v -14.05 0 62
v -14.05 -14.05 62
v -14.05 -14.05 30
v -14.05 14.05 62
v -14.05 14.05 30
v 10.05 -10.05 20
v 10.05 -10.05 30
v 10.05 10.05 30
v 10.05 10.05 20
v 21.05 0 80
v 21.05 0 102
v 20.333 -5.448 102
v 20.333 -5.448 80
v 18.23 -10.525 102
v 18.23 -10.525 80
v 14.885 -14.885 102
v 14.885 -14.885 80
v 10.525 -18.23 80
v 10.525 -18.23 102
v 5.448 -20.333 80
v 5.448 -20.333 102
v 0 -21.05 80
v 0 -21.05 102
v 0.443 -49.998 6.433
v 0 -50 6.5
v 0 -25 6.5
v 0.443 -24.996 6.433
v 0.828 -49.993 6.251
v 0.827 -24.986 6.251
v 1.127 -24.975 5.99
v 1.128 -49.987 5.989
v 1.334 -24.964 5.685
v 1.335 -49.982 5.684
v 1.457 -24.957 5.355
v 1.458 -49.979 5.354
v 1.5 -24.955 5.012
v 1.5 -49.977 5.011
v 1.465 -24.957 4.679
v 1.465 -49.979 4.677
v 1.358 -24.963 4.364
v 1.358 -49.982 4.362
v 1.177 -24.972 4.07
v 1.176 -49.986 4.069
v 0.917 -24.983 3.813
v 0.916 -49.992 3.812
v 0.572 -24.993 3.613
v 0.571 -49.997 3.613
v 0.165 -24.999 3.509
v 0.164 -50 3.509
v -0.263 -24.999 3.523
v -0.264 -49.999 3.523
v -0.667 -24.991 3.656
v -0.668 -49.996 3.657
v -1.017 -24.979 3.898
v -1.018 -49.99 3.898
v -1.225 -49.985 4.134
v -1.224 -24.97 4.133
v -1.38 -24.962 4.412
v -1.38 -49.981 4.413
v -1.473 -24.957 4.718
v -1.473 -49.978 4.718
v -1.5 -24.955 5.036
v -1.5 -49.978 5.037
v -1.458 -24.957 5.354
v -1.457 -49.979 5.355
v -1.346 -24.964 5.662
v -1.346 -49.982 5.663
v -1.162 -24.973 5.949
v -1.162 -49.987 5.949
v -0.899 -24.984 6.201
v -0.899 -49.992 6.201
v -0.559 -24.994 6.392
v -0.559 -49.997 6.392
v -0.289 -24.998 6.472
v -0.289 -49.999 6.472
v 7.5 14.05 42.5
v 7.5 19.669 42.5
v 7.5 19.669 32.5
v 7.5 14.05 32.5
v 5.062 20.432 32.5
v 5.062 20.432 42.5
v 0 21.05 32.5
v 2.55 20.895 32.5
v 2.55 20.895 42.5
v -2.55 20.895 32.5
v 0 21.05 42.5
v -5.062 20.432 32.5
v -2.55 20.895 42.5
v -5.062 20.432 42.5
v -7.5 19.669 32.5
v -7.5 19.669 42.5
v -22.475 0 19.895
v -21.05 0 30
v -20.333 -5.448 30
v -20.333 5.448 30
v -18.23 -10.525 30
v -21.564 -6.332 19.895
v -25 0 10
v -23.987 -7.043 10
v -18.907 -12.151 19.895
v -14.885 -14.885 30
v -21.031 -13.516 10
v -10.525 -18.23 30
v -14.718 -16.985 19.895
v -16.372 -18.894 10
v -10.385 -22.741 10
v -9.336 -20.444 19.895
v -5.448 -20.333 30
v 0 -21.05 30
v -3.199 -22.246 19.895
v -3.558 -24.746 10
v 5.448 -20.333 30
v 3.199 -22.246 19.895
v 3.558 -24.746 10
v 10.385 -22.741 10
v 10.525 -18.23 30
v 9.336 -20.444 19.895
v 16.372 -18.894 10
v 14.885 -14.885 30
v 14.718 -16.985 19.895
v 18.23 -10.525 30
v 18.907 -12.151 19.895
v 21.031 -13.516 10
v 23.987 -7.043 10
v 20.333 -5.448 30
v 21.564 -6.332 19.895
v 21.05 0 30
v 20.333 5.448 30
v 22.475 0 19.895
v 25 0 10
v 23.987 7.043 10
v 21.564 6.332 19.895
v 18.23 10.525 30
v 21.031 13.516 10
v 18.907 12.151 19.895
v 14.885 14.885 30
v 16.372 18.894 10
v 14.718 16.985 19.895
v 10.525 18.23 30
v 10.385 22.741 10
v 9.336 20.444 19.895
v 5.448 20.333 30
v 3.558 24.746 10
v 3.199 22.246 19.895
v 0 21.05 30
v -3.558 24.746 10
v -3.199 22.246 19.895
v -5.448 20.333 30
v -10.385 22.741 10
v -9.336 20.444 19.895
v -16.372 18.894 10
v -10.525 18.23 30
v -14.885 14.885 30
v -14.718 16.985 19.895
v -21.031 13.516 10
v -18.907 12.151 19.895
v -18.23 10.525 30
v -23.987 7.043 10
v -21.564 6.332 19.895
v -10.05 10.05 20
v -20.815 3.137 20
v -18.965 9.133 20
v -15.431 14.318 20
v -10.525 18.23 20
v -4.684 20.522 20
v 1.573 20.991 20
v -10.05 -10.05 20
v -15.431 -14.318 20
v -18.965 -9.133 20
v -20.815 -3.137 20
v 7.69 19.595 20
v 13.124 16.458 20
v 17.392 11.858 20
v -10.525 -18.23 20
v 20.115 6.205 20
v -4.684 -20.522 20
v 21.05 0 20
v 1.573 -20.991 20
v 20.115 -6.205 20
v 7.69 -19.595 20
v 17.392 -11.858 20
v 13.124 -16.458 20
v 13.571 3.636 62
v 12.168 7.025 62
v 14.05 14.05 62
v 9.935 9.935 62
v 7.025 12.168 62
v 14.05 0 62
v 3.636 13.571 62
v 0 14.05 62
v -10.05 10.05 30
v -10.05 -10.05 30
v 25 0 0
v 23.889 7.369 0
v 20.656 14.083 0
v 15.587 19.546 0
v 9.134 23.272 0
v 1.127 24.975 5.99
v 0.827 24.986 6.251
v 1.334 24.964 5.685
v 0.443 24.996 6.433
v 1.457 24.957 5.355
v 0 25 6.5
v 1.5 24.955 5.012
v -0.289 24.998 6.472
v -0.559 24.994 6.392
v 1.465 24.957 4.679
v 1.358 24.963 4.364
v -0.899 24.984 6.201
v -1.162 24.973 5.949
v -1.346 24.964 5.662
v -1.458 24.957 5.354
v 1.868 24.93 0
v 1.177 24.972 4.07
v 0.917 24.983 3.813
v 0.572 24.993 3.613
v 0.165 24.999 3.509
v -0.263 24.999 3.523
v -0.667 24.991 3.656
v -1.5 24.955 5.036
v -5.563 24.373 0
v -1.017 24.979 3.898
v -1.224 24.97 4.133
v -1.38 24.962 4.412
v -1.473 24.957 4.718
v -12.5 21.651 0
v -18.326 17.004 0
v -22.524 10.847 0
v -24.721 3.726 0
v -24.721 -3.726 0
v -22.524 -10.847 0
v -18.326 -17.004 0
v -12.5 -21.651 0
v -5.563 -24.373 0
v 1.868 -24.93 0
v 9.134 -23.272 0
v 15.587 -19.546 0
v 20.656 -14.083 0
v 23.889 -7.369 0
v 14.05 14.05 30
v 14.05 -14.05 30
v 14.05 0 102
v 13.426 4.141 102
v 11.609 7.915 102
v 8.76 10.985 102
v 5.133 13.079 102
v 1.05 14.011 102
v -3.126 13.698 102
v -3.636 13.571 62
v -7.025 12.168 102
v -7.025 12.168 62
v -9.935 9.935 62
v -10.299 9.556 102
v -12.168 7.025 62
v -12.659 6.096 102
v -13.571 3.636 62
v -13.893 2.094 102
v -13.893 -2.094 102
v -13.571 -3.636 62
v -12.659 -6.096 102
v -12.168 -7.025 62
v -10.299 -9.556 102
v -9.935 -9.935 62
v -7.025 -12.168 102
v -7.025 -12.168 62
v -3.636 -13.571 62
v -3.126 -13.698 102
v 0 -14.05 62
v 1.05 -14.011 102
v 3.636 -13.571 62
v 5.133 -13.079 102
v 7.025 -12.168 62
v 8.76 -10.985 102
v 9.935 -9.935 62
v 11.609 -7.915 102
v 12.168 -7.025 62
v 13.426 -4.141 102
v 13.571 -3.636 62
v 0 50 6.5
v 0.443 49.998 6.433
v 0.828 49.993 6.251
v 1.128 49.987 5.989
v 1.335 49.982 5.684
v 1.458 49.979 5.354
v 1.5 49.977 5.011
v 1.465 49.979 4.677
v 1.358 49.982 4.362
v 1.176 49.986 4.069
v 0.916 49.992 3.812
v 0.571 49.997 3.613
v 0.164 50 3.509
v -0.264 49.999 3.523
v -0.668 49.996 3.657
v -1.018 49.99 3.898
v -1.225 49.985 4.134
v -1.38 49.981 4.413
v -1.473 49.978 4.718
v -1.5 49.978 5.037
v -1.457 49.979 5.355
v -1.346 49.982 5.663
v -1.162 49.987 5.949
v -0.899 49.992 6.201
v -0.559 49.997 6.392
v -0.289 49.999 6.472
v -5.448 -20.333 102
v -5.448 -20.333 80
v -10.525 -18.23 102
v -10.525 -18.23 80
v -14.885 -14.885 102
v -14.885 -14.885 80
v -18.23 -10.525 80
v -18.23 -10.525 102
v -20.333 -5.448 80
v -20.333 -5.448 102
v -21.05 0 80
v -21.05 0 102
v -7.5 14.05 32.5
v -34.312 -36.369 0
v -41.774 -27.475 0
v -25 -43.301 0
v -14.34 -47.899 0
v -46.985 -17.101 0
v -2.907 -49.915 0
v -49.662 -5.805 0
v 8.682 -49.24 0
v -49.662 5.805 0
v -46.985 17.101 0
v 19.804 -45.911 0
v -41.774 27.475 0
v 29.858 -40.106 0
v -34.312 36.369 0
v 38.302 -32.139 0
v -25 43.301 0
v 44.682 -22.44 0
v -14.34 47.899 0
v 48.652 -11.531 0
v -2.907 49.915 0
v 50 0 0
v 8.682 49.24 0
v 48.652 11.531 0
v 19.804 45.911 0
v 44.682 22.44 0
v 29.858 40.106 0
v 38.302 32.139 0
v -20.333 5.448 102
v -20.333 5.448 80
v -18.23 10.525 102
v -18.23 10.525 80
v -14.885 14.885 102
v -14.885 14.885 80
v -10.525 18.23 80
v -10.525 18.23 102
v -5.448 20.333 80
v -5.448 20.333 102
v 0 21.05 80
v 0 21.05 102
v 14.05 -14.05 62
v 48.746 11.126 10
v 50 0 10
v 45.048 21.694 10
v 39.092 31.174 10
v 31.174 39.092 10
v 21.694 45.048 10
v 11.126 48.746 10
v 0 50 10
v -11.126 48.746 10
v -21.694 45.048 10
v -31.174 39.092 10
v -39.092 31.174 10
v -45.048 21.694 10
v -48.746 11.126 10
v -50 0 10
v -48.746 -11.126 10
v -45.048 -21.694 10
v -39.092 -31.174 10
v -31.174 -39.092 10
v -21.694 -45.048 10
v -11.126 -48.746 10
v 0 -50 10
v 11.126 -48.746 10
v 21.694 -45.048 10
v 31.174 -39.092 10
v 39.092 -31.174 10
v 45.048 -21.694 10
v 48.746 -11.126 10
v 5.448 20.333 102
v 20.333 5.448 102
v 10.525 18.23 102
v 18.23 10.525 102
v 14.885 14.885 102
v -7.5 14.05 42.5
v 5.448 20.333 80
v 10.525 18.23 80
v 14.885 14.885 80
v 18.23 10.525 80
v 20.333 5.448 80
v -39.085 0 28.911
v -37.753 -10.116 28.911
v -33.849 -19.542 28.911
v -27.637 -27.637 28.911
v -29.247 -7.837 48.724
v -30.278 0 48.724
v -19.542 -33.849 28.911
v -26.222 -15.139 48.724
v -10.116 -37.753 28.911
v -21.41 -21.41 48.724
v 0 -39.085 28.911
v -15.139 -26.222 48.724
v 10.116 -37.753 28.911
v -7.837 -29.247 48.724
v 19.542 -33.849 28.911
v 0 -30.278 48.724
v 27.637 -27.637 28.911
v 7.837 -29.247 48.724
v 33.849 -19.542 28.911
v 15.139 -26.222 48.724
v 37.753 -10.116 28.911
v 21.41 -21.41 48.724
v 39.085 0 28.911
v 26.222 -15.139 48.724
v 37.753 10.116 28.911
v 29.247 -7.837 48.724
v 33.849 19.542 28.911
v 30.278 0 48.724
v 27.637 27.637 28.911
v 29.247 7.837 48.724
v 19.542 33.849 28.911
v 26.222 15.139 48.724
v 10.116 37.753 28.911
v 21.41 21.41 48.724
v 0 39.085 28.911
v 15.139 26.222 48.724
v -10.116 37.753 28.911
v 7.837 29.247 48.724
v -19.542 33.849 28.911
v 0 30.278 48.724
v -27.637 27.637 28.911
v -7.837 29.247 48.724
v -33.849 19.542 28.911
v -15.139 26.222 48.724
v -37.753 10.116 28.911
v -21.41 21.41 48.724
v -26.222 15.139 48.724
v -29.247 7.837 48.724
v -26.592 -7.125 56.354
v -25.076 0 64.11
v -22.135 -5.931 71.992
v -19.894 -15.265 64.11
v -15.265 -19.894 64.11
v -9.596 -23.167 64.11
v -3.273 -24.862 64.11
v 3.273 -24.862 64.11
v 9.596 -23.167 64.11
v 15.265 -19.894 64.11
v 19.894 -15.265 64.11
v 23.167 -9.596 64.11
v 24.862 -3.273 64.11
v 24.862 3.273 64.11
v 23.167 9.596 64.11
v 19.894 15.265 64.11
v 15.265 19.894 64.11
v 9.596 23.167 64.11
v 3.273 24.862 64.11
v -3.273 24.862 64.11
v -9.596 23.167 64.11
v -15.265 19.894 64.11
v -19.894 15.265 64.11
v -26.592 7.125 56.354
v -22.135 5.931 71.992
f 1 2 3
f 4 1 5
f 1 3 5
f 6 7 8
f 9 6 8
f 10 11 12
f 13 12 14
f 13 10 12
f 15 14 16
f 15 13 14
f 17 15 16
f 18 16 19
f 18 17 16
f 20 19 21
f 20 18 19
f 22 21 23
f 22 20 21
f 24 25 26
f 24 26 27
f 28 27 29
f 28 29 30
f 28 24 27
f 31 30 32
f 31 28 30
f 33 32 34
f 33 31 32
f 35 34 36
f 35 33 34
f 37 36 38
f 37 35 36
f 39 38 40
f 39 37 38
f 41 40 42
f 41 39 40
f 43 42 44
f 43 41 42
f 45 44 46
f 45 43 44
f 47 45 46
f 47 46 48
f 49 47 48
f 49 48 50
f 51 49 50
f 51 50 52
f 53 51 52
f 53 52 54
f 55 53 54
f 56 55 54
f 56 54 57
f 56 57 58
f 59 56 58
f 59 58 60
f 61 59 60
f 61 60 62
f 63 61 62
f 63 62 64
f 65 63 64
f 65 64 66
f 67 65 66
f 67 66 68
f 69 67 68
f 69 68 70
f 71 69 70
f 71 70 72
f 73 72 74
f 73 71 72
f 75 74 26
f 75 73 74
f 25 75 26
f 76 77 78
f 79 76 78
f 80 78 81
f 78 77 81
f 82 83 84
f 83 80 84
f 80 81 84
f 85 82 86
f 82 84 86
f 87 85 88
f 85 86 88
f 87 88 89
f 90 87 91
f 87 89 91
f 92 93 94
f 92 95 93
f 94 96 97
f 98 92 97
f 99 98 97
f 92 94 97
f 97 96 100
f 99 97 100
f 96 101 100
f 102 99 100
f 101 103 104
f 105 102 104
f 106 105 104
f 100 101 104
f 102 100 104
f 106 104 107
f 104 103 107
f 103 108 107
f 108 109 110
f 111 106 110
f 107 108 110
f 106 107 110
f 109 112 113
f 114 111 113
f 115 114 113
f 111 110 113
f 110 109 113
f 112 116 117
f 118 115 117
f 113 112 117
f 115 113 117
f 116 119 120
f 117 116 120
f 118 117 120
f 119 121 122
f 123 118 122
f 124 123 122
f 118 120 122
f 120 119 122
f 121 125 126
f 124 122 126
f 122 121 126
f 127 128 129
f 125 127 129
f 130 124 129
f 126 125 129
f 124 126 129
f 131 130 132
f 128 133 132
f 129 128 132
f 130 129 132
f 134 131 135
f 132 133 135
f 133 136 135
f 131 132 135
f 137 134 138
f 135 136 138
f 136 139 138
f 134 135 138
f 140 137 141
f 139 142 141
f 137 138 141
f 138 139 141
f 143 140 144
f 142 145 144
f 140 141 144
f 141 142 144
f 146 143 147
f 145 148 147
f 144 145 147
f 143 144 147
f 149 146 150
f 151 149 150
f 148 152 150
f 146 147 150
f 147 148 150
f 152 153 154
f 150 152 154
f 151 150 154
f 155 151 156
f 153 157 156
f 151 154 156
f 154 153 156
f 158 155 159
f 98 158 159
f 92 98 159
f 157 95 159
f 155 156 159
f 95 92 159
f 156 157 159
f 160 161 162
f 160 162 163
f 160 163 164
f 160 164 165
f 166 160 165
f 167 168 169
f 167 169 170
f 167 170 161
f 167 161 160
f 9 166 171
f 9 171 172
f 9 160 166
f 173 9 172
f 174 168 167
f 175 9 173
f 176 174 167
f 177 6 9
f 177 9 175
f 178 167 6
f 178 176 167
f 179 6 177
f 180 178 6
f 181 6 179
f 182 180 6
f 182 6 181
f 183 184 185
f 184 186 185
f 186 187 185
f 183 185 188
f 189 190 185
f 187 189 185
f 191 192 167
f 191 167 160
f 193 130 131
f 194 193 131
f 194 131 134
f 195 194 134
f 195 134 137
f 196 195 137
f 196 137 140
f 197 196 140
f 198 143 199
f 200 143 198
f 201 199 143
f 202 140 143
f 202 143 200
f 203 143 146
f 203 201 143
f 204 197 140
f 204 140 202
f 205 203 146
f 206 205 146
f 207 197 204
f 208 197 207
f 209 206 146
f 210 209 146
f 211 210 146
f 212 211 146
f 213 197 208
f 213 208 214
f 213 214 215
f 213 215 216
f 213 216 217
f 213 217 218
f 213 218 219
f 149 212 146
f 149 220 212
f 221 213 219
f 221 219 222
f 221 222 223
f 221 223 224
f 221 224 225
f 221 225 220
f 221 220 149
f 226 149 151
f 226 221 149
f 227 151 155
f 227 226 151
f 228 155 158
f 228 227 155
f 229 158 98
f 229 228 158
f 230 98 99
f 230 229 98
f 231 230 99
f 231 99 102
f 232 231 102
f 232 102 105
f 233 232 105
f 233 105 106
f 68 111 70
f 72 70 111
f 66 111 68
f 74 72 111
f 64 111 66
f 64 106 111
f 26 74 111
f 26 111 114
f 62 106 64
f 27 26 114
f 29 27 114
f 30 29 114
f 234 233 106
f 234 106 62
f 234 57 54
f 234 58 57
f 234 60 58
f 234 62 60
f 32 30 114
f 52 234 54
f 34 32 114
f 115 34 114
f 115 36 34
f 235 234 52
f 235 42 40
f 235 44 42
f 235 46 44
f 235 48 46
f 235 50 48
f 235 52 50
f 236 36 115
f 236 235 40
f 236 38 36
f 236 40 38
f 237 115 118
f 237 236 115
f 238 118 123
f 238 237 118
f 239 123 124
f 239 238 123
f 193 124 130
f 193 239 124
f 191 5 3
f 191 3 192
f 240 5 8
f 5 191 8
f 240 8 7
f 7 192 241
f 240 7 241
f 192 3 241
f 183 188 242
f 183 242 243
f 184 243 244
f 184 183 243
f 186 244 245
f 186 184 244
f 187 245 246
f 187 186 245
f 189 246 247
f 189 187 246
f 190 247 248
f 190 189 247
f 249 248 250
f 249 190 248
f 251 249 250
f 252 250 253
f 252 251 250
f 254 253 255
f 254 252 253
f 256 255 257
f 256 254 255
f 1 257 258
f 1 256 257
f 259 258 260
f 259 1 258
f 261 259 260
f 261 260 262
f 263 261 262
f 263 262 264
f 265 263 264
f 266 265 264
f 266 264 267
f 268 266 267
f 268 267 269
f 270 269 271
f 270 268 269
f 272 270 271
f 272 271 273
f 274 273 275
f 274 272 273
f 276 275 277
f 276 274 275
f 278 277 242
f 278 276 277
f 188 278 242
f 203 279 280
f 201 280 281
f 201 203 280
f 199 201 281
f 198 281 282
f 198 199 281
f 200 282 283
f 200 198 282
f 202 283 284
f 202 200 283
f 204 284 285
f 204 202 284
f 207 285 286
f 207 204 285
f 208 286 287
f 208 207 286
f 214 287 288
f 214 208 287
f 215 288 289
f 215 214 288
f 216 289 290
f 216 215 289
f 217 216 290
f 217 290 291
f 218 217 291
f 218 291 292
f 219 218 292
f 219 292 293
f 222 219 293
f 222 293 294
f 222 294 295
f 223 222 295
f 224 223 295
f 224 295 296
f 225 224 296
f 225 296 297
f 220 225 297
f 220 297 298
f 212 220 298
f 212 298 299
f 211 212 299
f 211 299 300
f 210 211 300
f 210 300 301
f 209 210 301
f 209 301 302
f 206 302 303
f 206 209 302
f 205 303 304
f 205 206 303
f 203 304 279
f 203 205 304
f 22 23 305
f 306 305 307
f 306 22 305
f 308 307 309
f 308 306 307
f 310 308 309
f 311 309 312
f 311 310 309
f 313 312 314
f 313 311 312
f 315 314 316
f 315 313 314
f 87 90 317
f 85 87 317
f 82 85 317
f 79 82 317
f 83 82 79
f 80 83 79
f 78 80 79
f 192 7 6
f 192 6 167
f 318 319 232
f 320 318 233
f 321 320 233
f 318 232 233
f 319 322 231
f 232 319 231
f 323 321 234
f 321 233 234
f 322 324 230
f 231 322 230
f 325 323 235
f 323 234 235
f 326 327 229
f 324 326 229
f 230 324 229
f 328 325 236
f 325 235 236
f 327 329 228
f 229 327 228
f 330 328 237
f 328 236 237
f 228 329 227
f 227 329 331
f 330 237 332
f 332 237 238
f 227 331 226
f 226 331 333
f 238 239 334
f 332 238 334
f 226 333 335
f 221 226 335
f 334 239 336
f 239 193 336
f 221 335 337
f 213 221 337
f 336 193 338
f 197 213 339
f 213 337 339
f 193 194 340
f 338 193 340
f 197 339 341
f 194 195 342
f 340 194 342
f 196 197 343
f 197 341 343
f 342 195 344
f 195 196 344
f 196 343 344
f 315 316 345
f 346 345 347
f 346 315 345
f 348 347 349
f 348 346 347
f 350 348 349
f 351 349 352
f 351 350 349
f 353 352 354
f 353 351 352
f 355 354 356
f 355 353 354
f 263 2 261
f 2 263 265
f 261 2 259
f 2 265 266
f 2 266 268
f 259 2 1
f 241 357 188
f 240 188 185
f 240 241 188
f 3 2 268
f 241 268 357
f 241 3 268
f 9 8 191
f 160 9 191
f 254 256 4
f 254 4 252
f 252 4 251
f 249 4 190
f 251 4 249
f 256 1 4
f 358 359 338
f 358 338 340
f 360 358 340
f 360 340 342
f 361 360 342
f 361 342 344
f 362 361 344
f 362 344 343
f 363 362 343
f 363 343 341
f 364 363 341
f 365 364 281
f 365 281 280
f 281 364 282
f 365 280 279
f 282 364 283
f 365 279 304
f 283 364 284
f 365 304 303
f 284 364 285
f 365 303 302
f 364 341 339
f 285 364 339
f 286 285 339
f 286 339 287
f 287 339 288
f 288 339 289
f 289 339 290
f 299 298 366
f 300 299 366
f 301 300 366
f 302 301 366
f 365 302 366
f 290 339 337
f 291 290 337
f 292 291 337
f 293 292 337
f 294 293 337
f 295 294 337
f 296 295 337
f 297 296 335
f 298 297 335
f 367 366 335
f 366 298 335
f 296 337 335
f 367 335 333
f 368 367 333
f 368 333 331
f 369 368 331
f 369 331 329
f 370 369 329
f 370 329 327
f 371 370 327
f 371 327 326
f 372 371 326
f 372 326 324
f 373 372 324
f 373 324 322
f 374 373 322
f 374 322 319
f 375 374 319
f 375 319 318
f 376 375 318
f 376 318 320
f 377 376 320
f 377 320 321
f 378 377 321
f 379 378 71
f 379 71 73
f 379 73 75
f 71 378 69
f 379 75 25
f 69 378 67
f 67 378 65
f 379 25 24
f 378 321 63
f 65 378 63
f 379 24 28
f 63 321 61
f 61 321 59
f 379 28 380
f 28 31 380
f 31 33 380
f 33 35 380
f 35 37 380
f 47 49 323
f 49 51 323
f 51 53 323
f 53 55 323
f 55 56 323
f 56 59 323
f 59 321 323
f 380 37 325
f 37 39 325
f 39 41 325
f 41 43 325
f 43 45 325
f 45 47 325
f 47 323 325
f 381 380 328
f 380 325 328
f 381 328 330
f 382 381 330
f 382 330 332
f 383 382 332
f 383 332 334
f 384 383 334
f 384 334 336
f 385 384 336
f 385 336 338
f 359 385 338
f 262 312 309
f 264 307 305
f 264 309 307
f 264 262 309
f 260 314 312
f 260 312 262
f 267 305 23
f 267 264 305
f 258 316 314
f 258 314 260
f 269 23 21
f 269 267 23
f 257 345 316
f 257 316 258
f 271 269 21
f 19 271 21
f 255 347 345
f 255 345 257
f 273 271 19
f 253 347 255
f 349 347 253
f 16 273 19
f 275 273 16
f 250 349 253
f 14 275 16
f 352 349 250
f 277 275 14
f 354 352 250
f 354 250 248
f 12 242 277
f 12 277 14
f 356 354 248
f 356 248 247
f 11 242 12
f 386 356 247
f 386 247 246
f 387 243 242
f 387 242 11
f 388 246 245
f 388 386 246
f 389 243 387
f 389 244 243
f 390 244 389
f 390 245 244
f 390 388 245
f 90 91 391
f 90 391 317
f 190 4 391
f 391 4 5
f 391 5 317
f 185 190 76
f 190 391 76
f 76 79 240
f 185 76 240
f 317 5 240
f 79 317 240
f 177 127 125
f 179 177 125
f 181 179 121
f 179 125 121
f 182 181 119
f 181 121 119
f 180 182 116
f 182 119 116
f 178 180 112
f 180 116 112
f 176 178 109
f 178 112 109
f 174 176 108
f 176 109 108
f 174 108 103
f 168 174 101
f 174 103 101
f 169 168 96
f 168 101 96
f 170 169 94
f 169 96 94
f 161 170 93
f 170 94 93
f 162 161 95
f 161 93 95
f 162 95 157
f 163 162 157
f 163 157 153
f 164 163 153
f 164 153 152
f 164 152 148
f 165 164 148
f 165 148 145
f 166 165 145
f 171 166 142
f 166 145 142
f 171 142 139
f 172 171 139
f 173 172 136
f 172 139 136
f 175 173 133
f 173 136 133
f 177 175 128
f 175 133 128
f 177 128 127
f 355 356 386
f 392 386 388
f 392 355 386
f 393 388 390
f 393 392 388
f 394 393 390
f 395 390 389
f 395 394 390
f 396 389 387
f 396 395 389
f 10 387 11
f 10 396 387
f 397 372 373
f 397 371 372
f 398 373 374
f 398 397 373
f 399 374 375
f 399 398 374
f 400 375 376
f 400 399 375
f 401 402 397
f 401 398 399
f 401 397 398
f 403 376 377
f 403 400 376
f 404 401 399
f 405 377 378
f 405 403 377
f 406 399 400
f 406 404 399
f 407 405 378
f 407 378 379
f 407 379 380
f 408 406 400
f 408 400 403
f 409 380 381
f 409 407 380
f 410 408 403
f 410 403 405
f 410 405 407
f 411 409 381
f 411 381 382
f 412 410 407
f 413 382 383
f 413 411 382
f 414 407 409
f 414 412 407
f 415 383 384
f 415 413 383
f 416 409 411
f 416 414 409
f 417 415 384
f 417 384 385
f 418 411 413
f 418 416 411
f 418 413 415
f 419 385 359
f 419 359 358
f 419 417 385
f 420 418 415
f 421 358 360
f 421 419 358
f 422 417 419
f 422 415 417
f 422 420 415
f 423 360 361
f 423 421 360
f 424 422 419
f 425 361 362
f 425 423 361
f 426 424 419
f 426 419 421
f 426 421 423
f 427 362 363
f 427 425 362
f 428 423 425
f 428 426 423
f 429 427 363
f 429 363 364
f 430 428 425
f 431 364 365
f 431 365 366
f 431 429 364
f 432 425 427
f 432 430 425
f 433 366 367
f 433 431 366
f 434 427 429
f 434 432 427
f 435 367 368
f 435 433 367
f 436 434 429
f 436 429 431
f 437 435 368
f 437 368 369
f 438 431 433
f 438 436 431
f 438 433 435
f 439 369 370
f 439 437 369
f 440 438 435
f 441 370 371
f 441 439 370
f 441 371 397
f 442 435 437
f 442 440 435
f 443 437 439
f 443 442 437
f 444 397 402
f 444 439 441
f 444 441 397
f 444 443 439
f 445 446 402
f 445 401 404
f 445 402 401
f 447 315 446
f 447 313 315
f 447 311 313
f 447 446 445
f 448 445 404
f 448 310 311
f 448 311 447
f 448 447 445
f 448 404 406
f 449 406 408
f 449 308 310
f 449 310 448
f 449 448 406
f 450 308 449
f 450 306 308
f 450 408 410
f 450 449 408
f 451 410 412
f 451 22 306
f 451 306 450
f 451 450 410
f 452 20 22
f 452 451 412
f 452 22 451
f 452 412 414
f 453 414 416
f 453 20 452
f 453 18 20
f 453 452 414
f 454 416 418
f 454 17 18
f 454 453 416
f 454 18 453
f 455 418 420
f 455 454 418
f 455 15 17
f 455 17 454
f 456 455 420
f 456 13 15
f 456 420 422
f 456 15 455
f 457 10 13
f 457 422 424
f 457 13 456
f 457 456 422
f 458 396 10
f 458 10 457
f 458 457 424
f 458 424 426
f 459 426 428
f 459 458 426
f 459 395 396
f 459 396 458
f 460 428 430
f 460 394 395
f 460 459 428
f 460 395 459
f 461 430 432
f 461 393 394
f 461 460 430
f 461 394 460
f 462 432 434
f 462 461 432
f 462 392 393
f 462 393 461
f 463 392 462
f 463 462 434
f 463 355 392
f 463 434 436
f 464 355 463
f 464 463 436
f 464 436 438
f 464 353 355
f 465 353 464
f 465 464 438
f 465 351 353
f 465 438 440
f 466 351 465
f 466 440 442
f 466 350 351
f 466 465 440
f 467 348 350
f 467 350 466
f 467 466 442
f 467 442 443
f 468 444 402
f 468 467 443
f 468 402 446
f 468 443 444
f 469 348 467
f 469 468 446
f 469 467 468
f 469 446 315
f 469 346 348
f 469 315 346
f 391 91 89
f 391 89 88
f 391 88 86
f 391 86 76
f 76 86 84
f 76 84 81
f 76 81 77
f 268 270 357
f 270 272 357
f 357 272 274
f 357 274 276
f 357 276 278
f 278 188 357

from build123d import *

# Parameters (mm, degrees)
SKETCH2_R               = 50
SKETCH2_R_2             = 25
BOSS_EXTRUDE1_DEPTH     = 10
CUT_EXTRUDE1_DEPTH      = 72.414284285
CUT_EXTRUDE1_DEPTH_BACK = 72.414284285
SKETCH3_R               = 1.5
SKETCH5_W               = 42.1
SKETCH5_H               = 42.1
SKETCH5_W_2             = 28.1
SKETCH5_H_2             = 28.1
BOSS_EXTRUDE3_DEPTH     = 32
SKETCH6_W               = 15
SKETCH6_H               = 10
CUT_EXTRUDE2_DEPTH      = 7
SKETCH7_W               = 42.1
SKETCH7_H               = 42.1
SKETCH7_R               = 14.05
BOSS_EXTRUDE4_DEPTH     = 40
CUT_EXTRUDE3_START      = -72
CUT_EXTRUDE3_DEPTH      = 72
CIRPATTERN1_COUNT       = 4
SKETCH12_R              = 21.05
SKETCH12_W              = 20.1
SKETCH12_H              = 20.1
BOSS_EXTRUDE5_DEPTH     = 10


with BuildPart() as part:
    # Sketch2 → Boss-Extrude1 (new body)
    with BuildSketch(Plane.XY):
        Circle(SKETCH2_R)
        Circle(SKETCH2_R_2, mode=Mode.SUBTRACT)
    extrude(amount=BOSS_EXTRUDE1_DEPTH)

    # Sketch3 → Cut-Extrude1 (cut, two sides: drawn at the far end of the back side and taken through both)
    with BuildSketch(Plane(origin=(0, 0, 0), x_dir=(1, 0, 0), z_dir=(0, 1, 0)).offset(-CUT_EXTRUDE1_DEPTH_BACK)):
        with Locations(Location((0, -5, 0), (0, 0, 270))):
            Circle(SKETCH3_R)
    extrude(amount=CUT_EXTRUDE1_DEPTH + CUT_EXTRUDE1_DEPTH_BACK, mode=Mode.SUBTRACT)



with BuildPart() as body_2:
    # Sketch5 → Boss-Extrude3 (new body)
    with BuildSketch(Plane.XY.offset(30)):
        Rectangle(SKETCH5_W, SKETCH5_H)
        Rectangle(SKETCH5_W_2, SKETCH5_H_2, mode=Mode.SUBTRACT)
    extrude(amount=BOSS_EXTRUDE3_DEPTH)

    # Sketch6 → Cut-Extrude2 (cut)
    with BuildSketch(Plane(origin=(0, 21.05, 0), x_dir=(1, 0, 0), z_dir=(0, 1, 0))):
        with Locations((0, -37.5)):
            Rectangle(SKETCH6_W, SKETCH6_H)
    extrude(amount=-CUT_EXTRUDE2_DEPTH, mode=Mode.SUBTRACT)

    # Sketch7 → Boss-Extrude4 (add)
    with BuildSketch(Plane.XY.offset(62)):
        Rectangle(SKETCH7_W, SKETCH7_H)
        Circle(SKETCH7_R, mode=Mode.SUBTRACT)
    extrude(amount=BOSS_EXTRUDE4_DEPTH)

    # Sketch11 → Cut-Extrude3 (cut)
    with BuildSketch(Plane.XY.offset(102).offset(CUT_EXTRUDE3_START)):
        with BuildLine():
            Line((0, 21.05), (-21.05, 21.05))
            Line((-21.05, 21.05), (-21.05, 0))
            ThreePointArc((-21.05, 0), (-14.884597744, 14.884597744), (0, 21.05))
        make_face()
    cut_extrude3 = extrude(amount=CUT_EXTRUDE3_DEPTH, mode=Mode.SUBTRACT)

    # CirPattern1: Cut-Extrude3 ×4 about axis
    cirpattern1_axis = Axis((0, 0, 102), (0, 0, 1))
    for i in range(1, CIRPATTERN1_COUNT):
        add(cut_extrude3.rotate(cirpattern1_axis, i * 360 / CIRPATTERN1_COUNT), mode=Mode.SUBTRACT)


with BuildPart() as part_1:
    add(part.part)

    add(body_2.part)  # Revolve2 merges body 2
    # Sketch10 → Revolve2 (revolve)
    with BuildSketch(Plane(origin=(0, 0, 0), x_dir=(1, 0, 0), z_dir=(0, 1, 0))):
        with BuildLine():
            Line((-50, -10), (-25, -10))
            add(Edge.make_bspline(
                [(-25, -10), (-21.924679616, -19.790318995), (-21.05, -30)],
                knots=[0, 0, 0, 1, 1, 1], degree=2))
            Line((-21.05, -30), (-21.05, -80))
            add(Edge.make_bspline(
                [(-50, -10), (-29.091325996, -42.246977979), (-21.05, -80)],
                knots=[0, 0, 0, 1, 1, 1], degree=2))
        make_face()
    revolve(axis=Axis((0, 0, 0), (0, 0, 1)))

    # Sketch12 → Boss-Extrude5 (add)
    with BuildSketch(Plane(origin=(0, 0, 30), x_dir=(-1, 0, 0), z_dir=(0, 0, -1))):
        with Locations(Location((0, 0, 0), (0, 0, 180))):
            Circle(SKETCH12_R)
        Rectangle(SKETCH12_W, SKETCH12_H, mode=Mode.SUBTRACT)
    extrude(amount=BOSS_EXTRUDE5_DEPTH)


solid = part_1.part
